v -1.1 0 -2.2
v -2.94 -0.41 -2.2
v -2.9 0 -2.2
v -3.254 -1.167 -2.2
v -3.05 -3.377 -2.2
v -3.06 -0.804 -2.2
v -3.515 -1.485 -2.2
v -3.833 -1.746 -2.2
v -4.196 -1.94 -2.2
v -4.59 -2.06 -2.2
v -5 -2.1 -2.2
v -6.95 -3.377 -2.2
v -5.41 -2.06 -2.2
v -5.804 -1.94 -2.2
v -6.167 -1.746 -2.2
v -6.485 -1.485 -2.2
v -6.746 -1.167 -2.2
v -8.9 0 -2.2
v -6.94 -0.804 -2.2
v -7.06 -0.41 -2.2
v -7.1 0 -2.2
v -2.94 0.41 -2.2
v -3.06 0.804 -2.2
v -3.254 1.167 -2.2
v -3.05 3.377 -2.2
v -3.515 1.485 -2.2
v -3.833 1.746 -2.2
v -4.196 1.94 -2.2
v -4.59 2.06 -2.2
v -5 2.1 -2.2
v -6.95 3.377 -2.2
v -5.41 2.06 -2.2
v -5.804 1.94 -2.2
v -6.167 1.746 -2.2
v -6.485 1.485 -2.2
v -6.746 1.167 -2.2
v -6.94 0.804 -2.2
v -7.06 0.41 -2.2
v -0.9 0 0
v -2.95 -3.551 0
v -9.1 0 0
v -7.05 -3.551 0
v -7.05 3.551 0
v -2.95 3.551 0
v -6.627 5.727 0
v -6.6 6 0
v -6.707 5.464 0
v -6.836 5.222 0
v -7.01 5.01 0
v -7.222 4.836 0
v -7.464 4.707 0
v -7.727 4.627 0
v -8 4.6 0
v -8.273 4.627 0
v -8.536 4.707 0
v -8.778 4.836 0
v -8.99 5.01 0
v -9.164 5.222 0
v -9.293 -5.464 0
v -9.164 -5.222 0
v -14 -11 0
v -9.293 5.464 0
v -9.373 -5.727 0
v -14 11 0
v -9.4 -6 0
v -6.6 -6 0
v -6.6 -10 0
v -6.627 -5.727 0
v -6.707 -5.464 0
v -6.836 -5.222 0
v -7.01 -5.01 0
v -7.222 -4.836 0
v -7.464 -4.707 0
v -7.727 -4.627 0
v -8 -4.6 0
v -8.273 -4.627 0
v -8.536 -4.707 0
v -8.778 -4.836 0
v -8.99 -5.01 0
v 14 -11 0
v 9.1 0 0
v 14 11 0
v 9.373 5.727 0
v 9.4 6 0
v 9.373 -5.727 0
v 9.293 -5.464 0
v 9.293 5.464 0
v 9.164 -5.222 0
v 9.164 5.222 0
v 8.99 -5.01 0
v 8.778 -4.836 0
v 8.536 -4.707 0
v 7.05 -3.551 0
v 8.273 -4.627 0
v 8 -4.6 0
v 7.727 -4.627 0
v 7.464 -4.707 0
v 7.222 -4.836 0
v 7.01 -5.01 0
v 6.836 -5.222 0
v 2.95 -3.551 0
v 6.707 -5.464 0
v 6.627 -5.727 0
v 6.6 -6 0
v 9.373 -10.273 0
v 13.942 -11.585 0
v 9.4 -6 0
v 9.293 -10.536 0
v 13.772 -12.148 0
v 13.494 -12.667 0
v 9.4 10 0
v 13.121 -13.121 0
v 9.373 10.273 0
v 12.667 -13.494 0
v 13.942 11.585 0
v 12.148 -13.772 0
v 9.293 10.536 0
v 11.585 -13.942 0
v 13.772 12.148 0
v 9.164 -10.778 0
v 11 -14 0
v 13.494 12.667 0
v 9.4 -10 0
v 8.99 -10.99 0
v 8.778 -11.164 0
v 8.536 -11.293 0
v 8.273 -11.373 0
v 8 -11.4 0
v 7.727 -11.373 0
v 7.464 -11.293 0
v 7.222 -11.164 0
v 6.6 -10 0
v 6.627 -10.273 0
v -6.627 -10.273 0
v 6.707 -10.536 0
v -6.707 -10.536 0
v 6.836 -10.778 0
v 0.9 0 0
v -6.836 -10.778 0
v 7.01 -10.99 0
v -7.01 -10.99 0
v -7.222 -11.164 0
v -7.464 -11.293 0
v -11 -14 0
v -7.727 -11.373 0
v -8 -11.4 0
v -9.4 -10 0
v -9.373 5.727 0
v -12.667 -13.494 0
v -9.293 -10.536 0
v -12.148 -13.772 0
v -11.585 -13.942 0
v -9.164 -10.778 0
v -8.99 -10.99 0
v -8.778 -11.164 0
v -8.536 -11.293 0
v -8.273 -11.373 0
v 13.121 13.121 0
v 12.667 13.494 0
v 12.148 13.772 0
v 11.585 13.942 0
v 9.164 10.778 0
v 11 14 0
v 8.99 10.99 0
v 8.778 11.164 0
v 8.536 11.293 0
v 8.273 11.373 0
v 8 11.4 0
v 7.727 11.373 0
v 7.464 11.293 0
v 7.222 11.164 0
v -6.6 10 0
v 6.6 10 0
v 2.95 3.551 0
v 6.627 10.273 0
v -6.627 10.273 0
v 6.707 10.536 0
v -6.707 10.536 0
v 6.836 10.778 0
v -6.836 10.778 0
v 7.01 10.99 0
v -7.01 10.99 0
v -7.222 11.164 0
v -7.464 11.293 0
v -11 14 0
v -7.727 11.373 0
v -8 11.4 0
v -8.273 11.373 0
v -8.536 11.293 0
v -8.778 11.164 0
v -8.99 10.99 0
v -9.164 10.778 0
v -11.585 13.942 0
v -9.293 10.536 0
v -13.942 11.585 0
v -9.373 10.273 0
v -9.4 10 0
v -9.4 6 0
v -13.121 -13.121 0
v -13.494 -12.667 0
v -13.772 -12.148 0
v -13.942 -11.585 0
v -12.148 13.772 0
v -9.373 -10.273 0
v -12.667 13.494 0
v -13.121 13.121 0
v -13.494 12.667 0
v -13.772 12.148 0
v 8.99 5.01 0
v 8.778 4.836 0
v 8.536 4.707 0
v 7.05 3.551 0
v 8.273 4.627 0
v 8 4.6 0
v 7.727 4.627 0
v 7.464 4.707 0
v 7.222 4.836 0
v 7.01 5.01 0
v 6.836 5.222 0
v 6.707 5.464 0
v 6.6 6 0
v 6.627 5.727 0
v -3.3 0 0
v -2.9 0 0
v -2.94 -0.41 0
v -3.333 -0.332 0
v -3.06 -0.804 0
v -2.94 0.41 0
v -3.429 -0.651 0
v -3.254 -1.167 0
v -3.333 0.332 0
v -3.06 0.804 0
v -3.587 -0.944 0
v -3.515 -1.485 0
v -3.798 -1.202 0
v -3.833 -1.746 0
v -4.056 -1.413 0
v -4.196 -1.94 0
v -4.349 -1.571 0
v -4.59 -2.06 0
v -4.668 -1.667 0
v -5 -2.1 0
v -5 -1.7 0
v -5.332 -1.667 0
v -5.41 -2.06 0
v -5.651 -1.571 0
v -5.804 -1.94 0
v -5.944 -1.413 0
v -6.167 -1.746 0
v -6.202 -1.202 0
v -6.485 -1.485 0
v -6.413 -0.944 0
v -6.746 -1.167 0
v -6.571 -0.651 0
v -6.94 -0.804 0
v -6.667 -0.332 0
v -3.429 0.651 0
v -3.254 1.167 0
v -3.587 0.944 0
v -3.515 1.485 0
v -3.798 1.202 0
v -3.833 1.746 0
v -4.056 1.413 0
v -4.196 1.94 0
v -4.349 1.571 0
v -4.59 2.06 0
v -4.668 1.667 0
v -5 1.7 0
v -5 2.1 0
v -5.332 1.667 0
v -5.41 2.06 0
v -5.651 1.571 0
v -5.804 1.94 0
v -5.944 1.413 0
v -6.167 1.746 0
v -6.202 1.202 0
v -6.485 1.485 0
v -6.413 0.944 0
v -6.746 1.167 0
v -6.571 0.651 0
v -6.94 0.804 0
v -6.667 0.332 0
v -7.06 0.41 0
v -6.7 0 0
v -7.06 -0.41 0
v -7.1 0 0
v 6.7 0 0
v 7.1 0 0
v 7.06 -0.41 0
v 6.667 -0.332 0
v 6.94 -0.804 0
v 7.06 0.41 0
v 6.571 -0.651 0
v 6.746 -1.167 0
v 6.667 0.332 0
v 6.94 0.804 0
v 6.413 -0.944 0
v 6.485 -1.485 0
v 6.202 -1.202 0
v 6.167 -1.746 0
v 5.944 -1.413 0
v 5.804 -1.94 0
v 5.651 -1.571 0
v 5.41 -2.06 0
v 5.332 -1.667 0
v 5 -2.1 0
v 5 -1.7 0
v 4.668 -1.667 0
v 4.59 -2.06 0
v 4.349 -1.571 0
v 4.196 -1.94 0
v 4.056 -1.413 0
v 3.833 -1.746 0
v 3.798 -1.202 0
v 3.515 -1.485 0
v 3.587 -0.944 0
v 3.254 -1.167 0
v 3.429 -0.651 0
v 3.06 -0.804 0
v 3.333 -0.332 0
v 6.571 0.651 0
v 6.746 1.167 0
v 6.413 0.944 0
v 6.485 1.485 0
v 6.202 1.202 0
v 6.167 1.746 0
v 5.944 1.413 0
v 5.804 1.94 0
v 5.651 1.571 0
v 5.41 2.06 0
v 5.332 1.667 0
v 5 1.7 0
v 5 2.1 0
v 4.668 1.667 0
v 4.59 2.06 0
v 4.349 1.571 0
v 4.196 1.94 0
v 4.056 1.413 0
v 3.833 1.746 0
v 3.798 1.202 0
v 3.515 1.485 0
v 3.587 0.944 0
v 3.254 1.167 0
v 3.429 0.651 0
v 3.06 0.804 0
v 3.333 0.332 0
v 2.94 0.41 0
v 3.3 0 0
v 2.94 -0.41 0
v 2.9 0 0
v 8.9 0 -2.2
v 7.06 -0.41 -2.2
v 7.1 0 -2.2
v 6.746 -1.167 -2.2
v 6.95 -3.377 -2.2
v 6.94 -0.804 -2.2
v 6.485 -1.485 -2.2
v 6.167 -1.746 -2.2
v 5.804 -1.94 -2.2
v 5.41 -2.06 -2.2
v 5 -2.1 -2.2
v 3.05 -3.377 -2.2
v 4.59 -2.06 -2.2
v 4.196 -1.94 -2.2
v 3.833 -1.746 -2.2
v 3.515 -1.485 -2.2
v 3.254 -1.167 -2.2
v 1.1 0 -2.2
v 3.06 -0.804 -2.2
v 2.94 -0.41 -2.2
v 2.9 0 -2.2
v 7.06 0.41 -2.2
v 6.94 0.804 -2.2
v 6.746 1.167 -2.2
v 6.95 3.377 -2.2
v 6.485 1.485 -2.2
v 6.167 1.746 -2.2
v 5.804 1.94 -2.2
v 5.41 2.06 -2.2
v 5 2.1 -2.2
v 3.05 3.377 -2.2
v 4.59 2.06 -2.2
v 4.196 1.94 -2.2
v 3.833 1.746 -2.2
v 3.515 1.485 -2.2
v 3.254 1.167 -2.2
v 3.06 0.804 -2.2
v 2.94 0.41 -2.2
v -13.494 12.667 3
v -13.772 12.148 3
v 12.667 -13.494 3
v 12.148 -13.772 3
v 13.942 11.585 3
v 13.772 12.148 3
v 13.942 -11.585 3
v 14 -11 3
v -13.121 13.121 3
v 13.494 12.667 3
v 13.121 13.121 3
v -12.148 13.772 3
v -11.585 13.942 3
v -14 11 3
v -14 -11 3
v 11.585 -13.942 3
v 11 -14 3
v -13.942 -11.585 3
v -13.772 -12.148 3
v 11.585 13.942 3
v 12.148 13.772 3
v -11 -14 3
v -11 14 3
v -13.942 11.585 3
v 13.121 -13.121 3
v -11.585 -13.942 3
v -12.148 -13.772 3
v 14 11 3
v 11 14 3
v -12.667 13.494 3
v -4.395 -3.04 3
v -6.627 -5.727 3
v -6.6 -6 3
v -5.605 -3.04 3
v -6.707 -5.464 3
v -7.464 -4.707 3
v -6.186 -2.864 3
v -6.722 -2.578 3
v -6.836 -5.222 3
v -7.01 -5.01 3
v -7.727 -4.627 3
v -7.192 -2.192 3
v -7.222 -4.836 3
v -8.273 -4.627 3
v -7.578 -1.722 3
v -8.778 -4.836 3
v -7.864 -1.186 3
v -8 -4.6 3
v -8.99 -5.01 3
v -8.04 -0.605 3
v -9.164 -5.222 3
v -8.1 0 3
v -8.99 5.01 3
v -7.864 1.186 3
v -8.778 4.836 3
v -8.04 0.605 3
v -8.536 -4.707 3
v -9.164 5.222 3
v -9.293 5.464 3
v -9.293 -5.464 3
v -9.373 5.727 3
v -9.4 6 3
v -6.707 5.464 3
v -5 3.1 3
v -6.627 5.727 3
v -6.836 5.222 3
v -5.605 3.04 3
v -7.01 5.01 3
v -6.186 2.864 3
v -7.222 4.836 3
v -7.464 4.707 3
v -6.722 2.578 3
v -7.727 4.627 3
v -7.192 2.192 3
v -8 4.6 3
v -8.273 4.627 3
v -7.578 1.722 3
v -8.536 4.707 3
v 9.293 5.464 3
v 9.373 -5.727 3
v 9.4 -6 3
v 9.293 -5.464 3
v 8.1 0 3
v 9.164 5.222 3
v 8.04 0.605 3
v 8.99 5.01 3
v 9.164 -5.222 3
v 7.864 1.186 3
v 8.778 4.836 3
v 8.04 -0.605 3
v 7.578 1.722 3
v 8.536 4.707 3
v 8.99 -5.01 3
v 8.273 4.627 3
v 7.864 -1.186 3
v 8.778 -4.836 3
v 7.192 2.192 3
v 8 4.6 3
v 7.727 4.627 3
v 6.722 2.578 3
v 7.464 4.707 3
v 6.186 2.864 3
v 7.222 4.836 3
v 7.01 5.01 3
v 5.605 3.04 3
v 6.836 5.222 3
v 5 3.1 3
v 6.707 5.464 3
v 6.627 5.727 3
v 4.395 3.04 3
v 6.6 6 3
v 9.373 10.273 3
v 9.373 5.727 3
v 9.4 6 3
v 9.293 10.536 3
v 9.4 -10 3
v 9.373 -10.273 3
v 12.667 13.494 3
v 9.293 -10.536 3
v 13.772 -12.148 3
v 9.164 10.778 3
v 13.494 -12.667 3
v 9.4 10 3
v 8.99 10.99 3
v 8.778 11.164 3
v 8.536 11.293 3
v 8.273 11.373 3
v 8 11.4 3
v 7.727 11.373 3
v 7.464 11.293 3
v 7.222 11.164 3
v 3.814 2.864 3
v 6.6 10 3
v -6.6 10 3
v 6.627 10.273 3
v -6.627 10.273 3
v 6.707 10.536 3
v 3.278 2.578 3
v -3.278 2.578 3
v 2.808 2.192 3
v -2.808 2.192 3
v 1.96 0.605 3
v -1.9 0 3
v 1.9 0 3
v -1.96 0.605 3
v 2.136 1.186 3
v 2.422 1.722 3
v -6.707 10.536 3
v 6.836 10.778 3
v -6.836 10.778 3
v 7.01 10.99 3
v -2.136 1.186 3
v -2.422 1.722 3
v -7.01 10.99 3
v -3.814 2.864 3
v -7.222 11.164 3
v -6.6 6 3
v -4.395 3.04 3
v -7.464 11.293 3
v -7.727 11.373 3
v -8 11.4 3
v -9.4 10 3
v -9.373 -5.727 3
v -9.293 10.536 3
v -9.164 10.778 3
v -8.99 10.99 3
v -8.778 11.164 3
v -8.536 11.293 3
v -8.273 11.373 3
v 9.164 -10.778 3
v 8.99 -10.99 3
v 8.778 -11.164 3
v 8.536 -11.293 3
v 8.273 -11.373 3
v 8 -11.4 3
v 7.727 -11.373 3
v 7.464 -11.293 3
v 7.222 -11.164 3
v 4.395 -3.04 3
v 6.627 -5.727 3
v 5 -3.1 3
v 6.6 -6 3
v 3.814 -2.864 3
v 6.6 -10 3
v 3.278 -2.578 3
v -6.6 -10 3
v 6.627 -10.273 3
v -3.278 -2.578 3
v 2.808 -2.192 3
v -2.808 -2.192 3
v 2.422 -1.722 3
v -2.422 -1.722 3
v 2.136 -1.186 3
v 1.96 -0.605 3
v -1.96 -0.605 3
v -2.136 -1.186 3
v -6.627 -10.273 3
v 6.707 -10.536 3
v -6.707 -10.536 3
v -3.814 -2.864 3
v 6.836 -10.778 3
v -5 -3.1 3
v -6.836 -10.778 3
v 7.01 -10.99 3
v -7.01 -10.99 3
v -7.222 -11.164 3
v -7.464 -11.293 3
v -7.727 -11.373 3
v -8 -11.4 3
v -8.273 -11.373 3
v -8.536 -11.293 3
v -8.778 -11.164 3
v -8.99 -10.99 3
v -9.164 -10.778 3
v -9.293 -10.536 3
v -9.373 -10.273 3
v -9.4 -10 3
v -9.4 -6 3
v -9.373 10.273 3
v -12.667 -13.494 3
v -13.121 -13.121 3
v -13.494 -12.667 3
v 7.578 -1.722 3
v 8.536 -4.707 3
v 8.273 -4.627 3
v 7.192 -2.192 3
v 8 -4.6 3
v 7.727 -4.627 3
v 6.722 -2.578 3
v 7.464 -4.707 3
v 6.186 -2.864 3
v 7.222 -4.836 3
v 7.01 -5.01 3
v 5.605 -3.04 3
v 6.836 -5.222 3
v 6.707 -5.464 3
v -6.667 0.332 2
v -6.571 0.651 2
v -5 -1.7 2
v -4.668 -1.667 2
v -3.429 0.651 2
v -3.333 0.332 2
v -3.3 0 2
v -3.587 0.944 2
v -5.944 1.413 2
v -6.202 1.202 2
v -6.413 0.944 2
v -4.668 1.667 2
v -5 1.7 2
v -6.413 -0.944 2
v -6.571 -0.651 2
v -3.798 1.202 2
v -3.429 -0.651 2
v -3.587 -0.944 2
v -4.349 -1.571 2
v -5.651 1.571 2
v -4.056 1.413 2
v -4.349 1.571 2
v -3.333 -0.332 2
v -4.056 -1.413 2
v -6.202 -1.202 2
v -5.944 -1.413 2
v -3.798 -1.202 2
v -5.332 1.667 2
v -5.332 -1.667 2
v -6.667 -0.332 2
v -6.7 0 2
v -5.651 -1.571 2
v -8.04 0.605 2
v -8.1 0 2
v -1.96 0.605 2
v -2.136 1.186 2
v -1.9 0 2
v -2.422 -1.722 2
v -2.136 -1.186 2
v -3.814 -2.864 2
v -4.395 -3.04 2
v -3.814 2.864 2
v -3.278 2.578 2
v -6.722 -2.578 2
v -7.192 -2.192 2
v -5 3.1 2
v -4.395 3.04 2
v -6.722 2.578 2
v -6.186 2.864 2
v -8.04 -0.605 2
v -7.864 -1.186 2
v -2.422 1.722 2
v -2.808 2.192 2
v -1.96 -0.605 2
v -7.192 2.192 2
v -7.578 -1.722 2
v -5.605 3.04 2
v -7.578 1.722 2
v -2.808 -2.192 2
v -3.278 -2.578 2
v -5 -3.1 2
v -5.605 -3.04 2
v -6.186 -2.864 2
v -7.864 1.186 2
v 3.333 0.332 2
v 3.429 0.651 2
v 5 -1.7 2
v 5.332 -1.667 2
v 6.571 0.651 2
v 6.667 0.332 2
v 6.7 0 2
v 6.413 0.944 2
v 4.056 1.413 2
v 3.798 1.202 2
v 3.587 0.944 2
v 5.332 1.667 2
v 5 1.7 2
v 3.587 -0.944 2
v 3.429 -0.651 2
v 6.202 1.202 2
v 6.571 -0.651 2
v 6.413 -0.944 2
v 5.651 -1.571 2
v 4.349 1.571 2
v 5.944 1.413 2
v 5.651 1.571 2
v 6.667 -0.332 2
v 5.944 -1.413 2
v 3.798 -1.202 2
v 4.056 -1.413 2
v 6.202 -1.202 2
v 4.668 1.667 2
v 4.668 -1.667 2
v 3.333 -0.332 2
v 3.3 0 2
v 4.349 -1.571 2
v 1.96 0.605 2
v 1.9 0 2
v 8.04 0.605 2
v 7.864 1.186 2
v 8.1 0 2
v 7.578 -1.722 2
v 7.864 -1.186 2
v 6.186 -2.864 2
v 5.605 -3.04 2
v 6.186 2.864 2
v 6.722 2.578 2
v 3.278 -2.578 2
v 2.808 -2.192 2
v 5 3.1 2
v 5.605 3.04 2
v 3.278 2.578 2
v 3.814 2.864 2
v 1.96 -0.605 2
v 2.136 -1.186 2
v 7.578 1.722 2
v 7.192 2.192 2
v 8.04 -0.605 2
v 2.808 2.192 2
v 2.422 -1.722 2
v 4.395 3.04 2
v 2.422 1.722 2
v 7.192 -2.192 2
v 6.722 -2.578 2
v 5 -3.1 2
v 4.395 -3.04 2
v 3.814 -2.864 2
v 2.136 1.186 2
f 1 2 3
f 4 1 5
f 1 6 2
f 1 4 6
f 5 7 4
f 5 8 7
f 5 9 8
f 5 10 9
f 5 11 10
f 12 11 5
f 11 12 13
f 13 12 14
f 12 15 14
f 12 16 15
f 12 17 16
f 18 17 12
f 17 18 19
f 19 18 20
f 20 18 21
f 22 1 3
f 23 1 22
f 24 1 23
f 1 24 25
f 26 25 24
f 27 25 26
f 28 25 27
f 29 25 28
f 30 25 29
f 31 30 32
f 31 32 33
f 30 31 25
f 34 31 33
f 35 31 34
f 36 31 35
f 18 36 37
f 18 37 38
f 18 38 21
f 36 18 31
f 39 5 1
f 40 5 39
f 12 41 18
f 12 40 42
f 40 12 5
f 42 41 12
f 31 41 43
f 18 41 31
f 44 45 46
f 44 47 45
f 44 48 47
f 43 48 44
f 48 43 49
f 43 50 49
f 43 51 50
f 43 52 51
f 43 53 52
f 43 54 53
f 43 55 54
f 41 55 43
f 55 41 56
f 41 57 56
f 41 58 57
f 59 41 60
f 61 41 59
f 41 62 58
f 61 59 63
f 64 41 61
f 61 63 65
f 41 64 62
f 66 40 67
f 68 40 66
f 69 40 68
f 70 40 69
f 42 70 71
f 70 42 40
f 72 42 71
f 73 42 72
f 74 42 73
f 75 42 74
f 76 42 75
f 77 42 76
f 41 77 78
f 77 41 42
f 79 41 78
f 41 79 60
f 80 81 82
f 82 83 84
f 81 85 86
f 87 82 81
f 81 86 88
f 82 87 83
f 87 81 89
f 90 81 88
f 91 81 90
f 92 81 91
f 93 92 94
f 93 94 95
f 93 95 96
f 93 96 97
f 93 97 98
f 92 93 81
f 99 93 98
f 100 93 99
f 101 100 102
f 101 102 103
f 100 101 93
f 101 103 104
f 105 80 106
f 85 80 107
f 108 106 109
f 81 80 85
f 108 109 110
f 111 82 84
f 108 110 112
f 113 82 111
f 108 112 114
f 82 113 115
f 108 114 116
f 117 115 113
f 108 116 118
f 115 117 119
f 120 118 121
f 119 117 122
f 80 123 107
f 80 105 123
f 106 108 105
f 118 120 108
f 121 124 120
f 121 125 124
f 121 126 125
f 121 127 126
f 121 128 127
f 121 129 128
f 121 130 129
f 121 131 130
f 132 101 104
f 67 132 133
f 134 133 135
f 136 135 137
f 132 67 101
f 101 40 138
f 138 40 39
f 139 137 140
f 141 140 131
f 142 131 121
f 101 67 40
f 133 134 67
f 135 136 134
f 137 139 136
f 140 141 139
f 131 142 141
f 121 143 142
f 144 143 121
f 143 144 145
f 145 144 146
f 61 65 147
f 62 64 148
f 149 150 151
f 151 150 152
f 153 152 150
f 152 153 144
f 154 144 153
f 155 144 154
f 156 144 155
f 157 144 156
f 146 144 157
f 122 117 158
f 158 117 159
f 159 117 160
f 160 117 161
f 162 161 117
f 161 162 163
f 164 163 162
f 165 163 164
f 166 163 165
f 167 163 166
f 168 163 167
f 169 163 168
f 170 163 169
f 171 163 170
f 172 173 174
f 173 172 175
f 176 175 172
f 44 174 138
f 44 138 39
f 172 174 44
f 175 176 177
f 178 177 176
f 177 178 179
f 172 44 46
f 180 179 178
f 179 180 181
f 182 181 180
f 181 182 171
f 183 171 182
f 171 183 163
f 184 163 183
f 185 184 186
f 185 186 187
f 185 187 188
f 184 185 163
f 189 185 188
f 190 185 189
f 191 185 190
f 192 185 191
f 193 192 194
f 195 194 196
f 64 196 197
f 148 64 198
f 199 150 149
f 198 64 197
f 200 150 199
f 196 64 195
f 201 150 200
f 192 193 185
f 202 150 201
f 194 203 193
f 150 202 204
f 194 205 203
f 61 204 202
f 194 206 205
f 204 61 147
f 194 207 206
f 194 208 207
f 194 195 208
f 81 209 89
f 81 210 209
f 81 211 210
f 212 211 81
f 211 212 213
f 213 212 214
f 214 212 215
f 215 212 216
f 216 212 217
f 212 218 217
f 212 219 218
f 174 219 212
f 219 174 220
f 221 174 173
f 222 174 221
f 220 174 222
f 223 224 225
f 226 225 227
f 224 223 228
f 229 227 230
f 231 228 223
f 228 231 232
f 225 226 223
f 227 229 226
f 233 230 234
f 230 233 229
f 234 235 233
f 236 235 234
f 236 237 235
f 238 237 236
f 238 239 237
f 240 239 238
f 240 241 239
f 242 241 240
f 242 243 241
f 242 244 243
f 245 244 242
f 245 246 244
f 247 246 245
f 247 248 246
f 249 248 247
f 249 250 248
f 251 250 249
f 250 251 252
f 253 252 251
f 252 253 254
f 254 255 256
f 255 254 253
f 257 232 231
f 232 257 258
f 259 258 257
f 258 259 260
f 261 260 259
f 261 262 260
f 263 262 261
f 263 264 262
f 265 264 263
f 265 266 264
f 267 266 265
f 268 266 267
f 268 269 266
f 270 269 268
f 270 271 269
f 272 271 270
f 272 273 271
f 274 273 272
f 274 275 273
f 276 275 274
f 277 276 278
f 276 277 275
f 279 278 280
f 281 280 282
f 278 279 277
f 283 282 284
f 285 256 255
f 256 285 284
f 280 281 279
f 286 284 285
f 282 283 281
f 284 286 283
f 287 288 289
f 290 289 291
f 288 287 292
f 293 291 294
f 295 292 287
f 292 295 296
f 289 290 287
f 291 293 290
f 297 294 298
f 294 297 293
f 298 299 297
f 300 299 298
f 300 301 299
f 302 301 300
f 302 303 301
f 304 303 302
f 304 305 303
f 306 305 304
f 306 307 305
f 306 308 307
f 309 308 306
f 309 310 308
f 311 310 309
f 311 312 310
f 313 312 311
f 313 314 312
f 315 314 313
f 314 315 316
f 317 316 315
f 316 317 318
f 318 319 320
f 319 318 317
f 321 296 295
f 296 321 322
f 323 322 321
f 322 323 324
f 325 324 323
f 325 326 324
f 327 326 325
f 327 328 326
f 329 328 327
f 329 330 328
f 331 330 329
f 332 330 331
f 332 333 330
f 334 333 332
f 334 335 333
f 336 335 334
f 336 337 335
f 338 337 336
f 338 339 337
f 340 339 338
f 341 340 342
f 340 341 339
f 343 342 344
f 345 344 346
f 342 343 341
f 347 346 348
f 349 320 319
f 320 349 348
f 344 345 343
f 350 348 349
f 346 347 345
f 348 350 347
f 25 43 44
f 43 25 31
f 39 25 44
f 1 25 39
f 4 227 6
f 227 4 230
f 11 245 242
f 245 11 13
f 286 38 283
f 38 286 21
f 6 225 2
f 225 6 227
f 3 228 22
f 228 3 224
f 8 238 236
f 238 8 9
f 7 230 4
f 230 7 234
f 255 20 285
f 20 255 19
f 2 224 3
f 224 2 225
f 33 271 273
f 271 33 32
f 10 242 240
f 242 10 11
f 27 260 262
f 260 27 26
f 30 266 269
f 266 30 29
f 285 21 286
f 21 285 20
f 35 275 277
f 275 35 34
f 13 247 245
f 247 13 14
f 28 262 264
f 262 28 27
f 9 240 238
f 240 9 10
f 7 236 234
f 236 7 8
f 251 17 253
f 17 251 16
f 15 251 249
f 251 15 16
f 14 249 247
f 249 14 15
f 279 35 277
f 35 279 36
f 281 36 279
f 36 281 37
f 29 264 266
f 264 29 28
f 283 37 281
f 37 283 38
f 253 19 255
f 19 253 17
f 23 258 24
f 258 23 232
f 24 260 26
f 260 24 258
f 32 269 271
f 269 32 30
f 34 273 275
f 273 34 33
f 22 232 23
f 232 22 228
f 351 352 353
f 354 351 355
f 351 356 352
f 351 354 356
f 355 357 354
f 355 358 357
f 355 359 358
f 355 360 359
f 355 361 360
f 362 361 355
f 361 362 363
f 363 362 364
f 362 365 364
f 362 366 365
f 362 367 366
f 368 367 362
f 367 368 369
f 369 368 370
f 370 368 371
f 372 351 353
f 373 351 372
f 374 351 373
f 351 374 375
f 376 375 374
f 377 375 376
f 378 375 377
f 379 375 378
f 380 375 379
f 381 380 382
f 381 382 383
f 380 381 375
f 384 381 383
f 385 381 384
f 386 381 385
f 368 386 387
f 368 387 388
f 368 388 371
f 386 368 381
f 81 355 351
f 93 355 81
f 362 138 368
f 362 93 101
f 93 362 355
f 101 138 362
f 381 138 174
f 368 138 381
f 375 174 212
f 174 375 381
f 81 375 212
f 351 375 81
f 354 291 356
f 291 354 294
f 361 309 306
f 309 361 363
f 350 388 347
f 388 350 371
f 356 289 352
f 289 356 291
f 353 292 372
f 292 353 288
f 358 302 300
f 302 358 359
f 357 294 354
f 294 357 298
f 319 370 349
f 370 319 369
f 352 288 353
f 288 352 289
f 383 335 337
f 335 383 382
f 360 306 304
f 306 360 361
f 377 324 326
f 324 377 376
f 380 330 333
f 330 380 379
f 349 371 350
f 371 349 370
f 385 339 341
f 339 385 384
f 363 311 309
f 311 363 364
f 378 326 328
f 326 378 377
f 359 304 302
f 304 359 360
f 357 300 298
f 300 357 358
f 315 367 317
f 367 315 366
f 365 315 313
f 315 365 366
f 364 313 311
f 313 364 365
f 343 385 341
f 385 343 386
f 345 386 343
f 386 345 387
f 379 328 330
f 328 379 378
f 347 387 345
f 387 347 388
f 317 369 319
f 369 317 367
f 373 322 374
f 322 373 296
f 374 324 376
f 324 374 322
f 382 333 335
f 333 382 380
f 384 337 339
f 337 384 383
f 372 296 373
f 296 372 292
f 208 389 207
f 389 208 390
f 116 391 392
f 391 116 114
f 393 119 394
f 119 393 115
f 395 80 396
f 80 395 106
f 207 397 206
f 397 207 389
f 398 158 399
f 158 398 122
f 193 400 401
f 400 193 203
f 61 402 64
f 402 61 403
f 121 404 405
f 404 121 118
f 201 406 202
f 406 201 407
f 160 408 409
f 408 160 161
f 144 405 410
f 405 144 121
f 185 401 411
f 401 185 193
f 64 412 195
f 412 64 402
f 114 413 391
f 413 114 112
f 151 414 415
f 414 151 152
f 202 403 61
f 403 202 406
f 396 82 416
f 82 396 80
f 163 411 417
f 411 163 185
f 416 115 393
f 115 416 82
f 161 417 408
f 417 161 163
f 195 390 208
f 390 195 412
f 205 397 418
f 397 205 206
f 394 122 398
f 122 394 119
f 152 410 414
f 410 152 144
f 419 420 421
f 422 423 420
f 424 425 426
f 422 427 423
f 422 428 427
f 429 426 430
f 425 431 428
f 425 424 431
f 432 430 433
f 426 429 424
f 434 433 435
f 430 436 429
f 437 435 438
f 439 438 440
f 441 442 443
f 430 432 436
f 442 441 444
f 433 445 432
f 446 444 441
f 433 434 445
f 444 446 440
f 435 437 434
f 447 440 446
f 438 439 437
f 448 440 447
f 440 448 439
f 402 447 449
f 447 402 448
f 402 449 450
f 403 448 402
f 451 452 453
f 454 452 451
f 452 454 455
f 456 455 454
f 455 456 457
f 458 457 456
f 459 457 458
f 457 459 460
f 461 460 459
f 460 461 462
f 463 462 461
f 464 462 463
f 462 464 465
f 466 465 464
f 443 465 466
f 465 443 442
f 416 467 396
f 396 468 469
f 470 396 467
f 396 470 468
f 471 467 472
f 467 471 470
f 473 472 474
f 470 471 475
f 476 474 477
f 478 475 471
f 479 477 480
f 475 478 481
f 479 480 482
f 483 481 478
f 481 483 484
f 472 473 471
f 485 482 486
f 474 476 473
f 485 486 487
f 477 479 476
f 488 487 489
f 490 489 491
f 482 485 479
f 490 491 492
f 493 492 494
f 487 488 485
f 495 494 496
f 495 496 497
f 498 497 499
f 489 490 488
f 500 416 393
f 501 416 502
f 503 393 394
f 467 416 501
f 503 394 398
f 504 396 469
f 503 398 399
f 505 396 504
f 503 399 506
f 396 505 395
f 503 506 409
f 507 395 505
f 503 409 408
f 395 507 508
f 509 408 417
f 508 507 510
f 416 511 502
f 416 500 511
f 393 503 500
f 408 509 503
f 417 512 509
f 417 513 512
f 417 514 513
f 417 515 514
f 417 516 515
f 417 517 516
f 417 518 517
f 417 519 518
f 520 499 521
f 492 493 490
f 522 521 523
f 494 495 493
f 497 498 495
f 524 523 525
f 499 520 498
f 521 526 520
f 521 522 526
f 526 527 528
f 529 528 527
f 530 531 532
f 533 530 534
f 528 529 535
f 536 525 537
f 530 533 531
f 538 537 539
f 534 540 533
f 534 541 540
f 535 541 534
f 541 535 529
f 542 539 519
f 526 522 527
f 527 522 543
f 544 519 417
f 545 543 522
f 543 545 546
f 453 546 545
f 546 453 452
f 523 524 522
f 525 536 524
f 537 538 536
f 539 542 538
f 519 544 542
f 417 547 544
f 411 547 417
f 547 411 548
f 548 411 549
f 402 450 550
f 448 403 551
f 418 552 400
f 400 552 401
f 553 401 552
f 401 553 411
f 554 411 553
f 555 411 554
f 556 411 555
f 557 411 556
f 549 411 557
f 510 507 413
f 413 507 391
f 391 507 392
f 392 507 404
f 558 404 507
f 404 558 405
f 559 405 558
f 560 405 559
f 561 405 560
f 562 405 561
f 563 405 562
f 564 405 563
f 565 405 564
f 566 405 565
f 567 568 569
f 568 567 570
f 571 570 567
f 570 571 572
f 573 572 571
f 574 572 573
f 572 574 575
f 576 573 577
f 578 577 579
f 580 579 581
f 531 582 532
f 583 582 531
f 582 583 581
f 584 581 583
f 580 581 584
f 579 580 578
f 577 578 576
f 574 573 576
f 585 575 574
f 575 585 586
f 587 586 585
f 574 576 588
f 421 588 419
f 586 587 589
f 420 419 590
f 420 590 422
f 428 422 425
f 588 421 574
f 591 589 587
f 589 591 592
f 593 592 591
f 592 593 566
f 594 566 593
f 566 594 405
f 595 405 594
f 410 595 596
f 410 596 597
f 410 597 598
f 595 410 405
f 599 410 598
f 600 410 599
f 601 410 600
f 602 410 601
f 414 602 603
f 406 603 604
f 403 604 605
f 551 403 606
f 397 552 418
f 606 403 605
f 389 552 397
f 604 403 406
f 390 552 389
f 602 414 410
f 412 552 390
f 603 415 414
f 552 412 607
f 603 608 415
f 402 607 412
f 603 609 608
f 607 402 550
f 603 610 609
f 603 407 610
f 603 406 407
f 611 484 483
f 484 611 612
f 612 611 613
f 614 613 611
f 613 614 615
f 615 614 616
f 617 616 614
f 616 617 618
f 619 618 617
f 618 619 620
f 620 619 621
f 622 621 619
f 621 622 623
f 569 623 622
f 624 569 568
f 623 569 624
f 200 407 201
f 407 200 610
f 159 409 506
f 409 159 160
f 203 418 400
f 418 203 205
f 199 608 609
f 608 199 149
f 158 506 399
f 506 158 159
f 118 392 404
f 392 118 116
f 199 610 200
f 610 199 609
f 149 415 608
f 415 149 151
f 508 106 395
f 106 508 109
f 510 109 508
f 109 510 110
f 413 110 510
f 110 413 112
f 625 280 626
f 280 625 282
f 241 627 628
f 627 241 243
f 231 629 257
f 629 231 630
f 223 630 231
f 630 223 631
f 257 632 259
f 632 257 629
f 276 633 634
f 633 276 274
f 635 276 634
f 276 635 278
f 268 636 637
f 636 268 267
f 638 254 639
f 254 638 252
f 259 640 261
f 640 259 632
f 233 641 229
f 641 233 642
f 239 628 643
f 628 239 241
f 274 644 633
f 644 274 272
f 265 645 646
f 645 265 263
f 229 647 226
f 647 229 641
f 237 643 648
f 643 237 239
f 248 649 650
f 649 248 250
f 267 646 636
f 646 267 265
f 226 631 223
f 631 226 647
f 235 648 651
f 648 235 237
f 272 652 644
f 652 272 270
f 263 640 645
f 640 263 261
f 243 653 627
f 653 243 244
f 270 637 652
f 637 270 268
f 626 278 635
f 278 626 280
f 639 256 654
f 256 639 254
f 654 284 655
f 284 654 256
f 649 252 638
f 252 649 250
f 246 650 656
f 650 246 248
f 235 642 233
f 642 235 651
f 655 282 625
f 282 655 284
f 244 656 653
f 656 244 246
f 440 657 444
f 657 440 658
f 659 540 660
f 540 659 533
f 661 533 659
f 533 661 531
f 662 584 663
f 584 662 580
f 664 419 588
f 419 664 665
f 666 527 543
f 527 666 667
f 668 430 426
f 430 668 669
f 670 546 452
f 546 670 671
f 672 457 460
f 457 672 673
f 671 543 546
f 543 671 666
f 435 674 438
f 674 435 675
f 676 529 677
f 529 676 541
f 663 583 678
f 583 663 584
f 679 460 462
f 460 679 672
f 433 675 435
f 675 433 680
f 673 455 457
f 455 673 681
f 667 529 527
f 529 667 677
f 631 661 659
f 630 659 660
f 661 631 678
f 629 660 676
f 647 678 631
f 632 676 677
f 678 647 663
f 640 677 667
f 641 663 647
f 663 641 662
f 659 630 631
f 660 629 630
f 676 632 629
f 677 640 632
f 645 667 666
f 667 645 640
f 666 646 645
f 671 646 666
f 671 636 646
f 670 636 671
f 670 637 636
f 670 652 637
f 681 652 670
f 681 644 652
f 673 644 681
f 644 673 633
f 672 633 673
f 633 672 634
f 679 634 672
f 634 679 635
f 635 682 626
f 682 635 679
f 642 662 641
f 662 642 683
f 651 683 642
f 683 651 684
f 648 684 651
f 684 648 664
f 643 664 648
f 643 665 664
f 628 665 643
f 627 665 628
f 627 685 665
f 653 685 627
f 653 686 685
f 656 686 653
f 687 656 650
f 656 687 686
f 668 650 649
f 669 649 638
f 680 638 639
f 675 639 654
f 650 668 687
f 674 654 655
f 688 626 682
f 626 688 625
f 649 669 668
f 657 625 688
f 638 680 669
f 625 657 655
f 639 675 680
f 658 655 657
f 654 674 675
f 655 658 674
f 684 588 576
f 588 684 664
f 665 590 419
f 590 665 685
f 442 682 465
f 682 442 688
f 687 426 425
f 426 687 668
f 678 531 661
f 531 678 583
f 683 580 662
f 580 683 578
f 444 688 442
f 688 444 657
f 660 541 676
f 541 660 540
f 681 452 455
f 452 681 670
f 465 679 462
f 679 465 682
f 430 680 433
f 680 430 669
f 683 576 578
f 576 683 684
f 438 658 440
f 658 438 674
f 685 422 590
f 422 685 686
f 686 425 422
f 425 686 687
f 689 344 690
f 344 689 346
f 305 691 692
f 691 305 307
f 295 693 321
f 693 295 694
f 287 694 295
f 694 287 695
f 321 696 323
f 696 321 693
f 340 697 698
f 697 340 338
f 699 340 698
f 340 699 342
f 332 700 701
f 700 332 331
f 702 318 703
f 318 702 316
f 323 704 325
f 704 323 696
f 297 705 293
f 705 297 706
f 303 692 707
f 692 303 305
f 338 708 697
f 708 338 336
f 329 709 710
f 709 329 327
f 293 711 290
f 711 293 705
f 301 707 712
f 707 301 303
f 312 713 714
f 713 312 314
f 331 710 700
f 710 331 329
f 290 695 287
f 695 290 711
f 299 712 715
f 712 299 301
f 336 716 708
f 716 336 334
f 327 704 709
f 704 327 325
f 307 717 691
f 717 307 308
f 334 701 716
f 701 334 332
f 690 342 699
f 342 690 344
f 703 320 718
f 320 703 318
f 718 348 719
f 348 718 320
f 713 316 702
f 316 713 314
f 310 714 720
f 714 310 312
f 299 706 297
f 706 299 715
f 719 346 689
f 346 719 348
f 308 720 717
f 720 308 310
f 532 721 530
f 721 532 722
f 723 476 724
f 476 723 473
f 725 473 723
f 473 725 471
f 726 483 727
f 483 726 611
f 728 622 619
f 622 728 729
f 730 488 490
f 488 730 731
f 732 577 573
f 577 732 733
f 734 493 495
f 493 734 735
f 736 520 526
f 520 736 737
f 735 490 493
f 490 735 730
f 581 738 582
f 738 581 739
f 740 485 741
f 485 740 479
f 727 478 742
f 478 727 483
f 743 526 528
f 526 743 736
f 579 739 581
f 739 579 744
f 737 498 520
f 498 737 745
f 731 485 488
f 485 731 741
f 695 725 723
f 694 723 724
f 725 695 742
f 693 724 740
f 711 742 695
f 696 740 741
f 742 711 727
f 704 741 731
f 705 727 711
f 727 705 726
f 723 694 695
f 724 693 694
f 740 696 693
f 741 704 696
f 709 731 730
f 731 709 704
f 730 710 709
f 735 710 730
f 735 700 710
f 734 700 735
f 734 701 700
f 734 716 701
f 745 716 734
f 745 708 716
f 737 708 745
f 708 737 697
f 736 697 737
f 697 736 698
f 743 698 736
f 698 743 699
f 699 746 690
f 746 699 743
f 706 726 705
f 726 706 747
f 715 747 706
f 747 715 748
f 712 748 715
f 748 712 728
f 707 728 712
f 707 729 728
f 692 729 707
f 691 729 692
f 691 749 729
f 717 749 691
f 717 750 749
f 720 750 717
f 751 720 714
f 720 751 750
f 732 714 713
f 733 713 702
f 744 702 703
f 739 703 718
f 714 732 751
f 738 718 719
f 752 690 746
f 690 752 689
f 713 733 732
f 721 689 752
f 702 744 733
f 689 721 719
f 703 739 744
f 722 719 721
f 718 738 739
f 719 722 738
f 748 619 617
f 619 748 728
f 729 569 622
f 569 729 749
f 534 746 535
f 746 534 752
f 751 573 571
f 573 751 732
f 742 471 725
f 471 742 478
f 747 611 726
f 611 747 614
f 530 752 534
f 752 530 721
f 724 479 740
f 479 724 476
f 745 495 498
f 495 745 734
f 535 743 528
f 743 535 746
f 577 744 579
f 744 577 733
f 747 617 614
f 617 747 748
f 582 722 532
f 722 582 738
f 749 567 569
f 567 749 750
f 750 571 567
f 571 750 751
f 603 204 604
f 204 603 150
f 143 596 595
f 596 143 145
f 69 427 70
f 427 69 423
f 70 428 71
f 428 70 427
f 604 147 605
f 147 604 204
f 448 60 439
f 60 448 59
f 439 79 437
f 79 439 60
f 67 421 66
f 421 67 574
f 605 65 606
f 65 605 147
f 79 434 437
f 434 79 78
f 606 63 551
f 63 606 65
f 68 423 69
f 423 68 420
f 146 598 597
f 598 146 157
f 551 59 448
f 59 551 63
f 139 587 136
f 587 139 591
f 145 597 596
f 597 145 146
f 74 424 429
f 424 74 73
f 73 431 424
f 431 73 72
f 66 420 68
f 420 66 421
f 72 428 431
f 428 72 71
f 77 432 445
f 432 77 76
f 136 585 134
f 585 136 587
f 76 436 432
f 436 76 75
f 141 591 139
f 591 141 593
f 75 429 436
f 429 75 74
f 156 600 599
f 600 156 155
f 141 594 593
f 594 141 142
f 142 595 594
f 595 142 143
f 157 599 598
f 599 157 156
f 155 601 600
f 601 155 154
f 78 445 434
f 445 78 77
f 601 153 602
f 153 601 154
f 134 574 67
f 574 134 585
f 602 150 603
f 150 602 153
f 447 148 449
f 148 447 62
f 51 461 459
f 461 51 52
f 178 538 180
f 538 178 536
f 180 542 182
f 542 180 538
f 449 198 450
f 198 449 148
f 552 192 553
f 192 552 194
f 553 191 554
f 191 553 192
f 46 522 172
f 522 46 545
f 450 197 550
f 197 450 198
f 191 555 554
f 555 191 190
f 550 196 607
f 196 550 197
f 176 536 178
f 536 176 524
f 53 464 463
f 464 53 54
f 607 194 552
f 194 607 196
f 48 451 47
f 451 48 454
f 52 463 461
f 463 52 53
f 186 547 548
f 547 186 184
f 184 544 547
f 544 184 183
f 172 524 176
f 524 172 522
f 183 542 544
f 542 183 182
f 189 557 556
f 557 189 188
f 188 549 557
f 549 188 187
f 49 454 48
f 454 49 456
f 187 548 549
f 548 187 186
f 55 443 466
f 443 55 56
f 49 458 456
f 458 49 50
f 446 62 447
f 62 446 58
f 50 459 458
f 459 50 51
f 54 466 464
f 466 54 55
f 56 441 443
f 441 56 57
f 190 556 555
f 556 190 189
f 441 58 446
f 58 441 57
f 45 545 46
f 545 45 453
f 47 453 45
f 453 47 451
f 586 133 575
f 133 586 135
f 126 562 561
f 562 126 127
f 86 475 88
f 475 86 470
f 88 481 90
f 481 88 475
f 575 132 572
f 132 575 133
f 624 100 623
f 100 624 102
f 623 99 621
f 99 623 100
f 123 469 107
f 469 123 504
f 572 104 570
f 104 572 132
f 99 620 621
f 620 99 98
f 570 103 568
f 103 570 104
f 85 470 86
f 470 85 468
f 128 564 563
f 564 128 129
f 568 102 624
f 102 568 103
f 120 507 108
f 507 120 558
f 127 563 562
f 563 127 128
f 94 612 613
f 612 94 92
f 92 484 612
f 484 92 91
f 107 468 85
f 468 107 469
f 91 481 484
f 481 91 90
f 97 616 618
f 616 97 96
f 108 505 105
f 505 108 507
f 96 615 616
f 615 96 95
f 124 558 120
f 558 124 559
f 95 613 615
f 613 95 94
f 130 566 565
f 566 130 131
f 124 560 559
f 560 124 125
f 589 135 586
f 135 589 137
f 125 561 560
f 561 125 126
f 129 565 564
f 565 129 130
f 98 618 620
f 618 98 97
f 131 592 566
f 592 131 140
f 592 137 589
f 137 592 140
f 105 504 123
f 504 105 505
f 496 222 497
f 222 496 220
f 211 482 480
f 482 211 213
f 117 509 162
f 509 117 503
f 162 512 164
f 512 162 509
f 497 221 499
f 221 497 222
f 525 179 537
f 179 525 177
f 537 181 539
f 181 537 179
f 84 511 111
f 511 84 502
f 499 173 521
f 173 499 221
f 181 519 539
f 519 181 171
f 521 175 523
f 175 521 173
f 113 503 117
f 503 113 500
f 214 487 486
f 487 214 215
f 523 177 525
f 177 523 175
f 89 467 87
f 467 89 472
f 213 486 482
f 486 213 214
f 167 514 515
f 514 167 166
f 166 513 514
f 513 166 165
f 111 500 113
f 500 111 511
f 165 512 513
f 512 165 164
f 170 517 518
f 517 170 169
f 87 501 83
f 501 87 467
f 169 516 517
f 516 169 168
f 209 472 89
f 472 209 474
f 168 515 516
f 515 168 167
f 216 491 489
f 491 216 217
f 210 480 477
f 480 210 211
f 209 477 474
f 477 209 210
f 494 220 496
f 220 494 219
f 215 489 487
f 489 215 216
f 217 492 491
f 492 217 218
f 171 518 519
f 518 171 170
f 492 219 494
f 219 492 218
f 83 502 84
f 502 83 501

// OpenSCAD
// file: rm_common.scad
// RobotMind's sole interface: blind hex port, hollow hex peg, optional M3 lock.
$fn = 32;

RM_EPS = 0.1;
RM_PLATE = 80;
RM_GRID = 10;
RM_PLATE_T = 8;
RM_PORT_INSET = 5;
RM_PORT_OD = 8;
RM_PORT_DEPTH = 2.2;
RM_INSERT_BORE = 3.4; // for an M3x3x4 heat-set insert
RM_INSERT_DEPTH = 3;
RM_PEG_ENTRY = 0.2;
RM_PEG_GRIP = 0.2;
RM_PEG_BORE = 4.2;   // clears the seated insert
RM_M3_CLEARANCE = 3.4;
RM_M3_HEAD_D = 6.2;
RM_JOIN_T = 4;
RM_JOIN_L = RM_PLATE;

function port_position(i) = -RM_PLATE/2 + RM_PORT_INSET + i*RM_GRID;
function join_columns() = [-25,-5,5,25];
function peg_root_od() = RM_PORT_OD + RM_PEG_GRIP;
function peg_tip_od() = RM_PORT_OD - RM_PEG_ENTRY;

assert(RM_PLATE_T - 2*RM_INSERT_DEPTH >= 2,
       "Opposing blind insert bores need a centre membrane");
assert(peg_root_od() > RM_PORT_OD && RM_PORT_OD > peg_tip_od(),
       "Peg needs a lead-in and final grip");

module rounded_box(size=[20,20,3], r=2) {
  linear_extrude(height=size[2])
    offset(r=r) offset(delta=-r) square([size[0],size[1]]);
}

module blind_port_cut() {
  translate([0,0,-RM_EPS]) cylinder(h=RM_PORT_DEPTH+RM_EPS,d=RM_PORT_OD,$fn=6);
  translate([0,0,-RM_EPS]) cylinder(h=RM_INSERT_DEPTH+RM_EPS,d=RM_INSERT_BORE);
}

module plate_port_cuts(top=false) {
  for(x=[0:7], y=[0:7])
    if(top)
      translate([port_position(x),port_position(y),RM_PLATE_T])
        mirror([0,0,1]) blind_port_cut();
    else
      translate([port_position(x),port_position(y),0]) blind_port_cut();
}

module plate_8x8() {
  difference() {
    translate([-RM_PLATE/2,-RM_PLATE/2,0])
      rounded_box([RM_PLATE,RM_PLATE,RM_PLATE_T],3);
    plate_port_cuts();
    plate_port_cuts(top=true);
  }
}

module mount_peg() {
  difference() {
    cylinder(h=RM_PORT_DEPTH,d1=peg_root_od(),d2=peg_tip_od(),$fn=6);
    translate([0,0,-RM_EPS]) cylinder(h=RM_PORT_DEPTH+2*RM_EPS,d=RM_PEG_BORE);
  }
}

module top_screw_cut() {
  translate([0,0,-RM_PORT_DEPTH-RM_EPS])
    cylinder(h=RM_JOIN_T+RM_PORT_DEPTH+2*RM_EPS,d=RM_M3_CLEARANCE);
  translate([0,0,RM_JOIN_T-2]) cylinder(h=2+RM_EPS,d=RM_M3_HEAD_D);
}

module side_screw_cut() {
  translate([0,-RM_JOIN_T-RM_EPS,0]) rotate([-90,0,0])
    cylinder(h=RM_JOIN_T+RM_EPS,d=RM_M3_CLEARANCE);
  translate([0,-RM_JOIN_T-RM_EPS,0]) rotate([-90,0,0])
    cylinder(h=2+RM_EPS,d=RM_M3_HEAD_D);
}
// main file
include <rm_common.scad>

// One generic 20 mm Grove plaque. Slots accept M2 screws or small zip ties.
module grove_plaque() {
  difference() {
    union() {
      translate([-14,-14,0]) rounded_box([28,28,3],3);
      for(x=[-5,5]) translate([x,0,0]) rotate([180,0,0]) mount_peg();
    }
    for(x=[-5,5]) translate([x,0,0]) top_screw_cut();
    for(x=[-8,8], y=[-8,8])
      translate([x,y,-RM_EPS]) linear_extrude(height=3+2*RM_EPS) hull() {
          translate([0,-2]) circle(d=2.8);
          translate([0,2]) circle(d=2.8);
        }
  }
}

grove_plaque();
